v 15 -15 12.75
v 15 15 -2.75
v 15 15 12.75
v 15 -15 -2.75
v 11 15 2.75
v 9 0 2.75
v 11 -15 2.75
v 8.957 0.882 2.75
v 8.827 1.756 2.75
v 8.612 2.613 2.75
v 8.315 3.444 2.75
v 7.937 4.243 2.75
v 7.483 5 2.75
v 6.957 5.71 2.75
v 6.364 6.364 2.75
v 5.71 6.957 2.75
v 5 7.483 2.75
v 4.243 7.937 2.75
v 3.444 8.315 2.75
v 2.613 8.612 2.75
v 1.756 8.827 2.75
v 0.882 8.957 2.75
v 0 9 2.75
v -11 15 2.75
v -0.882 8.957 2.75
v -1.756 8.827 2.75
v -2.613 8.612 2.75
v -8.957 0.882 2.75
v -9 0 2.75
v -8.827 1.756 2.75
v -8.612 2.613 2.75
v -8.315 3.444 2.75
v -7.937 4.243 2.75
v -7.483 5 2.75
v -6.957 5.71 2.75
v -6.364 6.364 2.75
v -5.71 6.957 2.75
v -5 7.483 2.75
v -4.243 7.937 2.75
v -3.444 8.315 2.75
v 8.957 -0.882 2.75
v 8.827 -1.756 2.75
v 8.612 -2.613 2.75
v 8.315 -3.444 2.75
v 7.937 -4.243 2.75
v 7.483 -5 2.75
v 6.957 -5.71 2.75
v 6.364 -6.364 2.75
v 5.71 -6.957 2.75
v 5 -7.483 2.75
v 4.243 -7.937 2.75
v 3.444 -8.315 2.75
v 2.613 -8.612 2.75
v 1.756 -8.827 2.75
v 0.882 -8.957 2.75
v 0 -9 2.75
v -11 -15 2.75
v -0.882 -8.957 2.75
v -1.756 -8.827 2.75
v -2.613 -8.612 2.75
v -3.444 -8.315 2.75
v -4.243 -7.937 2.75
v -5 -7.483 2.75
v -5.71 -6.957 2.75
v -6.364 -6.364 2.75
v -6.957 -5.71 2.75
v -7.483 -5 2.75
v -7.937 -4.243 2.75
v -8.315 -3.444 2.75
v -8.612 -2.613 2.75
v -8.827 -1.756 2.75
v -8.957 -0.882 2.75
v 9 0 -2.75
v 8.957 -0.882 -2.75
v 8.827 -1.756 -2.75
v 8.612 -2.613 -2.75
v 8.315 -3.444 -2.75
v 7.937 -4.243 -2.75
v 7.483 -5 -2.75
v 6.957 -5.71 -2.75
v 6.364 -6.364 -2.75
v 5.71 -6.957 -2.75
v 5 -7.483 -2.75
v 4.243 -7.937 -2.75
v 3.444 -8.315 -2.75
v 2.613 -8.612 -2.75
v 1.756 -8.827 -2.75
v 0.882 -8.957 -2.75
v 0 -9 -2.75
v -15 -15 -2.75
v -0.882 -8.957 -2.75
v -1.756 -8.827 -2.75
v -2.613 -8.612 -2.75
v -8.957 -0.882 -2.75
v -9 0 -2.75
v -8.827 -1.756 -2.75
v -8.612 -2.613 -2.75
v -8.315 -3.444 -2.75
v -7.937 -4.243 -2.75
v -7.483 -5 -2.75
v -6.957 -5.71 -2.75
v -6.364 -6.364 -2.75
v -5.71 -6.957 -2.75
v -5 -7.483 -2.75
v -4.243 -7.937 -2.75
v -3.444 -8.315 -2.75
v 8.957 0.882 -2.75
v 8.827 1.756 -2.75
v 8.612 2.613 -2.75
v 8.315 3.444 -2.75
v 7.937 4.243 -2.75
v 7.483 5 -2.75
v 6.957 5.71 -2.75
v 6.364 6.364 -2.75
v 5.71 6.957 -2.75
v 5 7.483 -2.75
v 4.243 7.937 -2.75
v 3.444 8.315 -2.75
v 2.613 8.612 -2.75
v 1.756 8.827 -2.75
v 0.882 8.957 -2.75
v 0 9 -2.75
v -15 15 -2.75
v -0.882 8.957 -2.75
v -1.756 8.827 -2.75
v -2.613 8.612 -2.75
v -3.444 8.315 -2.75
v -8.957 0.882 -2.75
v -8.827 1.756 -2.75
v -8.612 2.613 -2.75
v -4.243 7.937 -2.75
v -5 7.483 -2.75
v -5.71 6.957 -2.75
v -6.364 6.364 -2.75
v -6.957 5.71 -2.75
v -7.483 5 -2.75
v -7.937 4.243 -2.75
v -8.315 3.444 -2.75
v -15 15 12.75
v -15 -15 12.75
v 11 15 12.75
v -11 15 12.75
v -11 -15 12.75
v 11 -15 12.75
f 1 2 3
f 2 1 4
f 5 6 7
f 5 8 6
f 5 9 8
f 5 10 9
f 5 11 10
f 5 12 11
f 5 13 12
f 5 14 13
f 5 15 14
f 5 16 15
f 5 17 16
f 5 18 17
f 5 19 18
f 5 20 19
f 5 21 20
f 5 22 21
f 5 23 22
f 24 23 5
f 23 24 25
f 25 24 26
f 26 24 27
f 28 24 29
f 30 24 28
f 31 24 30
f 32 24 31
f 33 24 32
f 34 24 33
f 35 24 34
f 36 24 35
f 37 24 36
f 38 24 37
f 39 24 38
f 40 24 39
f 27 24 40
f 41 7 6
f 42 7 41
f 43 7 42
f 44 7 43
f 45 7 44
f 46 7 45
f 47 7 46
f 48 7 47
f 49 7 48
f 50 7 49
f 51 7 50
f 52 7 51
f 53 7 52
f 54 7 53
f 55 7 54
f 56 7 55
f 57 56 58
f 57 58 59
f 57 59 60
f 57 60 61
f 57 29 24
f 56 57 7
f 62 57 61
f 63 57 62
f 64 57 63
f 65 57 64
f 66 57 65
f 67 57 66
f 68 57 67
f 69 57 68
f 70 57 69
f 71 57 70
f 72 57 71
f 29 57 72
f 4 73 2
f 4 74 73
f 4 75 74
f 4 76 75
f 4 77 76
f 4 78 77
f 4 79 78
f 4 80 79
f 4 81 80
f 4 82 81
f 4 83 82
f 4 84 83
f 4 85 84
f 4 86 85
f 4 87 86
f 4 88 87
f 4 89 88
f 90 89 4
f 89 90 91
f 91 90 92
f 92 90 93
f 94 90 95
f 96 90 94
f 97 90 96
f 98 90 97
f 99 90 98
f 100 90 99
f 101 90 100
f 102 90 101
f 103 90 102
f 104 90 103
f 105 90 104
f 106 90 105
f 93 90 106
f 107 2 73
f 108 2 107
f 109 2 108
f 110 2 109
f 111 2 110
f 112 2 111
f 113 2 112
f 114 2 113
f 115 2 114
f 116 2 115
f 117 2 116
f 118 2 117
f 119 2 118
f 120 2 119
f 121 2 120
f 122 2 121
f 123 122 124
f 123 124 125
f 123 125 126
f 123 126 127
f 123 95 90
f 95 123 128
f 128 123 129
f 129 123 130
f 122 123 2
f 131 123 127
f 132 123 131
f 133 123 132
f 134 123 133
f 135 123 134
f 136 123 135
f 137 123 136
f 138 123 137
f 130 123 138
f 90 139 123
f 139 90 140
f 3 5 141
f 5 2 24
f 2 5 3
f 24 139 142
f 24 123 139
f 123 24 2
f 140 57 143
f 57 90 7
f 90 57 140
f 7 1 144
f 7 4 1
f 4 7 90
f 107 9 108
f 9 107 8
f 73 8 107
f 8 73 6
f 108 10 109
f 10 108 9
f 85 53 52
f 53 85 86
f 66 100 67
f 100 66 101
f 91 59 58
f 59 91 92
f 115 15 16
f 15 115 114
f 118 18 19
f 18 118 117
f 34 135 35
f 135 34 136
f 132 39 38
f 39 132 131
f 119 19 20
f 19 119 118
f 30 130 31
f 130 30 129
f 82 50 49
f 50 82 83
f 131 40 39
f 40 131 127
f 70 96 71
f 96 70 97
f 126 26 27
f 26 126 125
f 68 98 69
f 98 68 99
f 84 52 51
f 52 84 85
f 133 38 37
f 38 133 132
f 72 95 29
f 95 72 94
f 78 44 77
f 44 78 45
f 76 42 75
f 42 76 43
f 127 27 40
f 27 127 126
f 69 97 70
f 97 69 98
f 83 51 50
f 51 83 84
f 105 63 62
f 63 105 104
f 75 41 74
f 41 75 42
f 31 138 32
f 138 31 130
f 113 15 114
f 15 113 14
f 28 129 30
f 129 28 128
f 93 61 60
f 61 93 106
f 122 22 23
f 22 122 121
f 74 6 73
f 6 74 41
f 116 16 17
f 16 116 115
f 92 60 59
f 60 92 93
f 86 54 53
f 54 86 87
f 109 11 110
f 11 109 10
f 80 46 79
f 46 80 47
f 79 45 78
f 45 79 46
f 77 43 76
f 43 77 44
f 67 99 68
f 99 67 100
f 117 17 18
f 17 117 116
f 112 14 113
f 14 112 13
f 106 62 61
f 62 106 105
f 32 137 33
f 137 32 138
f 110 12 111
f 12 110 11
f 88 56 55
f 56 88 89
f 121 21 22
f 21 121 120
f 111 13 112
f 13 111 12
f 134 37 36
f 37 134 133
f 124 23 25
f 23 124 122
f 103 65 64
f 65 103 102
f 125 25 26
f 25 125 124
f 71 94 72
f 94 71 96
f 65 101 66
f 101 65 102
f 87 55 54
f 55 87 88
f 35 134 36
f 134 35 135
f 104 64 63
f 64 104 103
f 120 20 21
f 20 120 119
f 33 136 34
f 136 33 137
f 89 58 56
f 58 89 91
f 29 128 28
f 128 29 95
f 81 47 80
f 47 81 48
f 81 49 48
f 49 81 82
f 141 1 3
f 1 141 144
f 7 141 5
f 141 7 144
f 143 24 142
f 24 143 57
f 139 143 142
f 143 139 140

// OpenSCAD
$fn=64;
difference()
{
  cube([30,30,5.5],center=true);
  cylinder(d=18,h=6,center=true);
}
translate([30/2-4/2,0,10/2+5.5/2]) cube([4,30,10],center=true);
translate([-(30/2-4/2),0,10/2+5.5/2]) cube([4,30,10],center=true);
